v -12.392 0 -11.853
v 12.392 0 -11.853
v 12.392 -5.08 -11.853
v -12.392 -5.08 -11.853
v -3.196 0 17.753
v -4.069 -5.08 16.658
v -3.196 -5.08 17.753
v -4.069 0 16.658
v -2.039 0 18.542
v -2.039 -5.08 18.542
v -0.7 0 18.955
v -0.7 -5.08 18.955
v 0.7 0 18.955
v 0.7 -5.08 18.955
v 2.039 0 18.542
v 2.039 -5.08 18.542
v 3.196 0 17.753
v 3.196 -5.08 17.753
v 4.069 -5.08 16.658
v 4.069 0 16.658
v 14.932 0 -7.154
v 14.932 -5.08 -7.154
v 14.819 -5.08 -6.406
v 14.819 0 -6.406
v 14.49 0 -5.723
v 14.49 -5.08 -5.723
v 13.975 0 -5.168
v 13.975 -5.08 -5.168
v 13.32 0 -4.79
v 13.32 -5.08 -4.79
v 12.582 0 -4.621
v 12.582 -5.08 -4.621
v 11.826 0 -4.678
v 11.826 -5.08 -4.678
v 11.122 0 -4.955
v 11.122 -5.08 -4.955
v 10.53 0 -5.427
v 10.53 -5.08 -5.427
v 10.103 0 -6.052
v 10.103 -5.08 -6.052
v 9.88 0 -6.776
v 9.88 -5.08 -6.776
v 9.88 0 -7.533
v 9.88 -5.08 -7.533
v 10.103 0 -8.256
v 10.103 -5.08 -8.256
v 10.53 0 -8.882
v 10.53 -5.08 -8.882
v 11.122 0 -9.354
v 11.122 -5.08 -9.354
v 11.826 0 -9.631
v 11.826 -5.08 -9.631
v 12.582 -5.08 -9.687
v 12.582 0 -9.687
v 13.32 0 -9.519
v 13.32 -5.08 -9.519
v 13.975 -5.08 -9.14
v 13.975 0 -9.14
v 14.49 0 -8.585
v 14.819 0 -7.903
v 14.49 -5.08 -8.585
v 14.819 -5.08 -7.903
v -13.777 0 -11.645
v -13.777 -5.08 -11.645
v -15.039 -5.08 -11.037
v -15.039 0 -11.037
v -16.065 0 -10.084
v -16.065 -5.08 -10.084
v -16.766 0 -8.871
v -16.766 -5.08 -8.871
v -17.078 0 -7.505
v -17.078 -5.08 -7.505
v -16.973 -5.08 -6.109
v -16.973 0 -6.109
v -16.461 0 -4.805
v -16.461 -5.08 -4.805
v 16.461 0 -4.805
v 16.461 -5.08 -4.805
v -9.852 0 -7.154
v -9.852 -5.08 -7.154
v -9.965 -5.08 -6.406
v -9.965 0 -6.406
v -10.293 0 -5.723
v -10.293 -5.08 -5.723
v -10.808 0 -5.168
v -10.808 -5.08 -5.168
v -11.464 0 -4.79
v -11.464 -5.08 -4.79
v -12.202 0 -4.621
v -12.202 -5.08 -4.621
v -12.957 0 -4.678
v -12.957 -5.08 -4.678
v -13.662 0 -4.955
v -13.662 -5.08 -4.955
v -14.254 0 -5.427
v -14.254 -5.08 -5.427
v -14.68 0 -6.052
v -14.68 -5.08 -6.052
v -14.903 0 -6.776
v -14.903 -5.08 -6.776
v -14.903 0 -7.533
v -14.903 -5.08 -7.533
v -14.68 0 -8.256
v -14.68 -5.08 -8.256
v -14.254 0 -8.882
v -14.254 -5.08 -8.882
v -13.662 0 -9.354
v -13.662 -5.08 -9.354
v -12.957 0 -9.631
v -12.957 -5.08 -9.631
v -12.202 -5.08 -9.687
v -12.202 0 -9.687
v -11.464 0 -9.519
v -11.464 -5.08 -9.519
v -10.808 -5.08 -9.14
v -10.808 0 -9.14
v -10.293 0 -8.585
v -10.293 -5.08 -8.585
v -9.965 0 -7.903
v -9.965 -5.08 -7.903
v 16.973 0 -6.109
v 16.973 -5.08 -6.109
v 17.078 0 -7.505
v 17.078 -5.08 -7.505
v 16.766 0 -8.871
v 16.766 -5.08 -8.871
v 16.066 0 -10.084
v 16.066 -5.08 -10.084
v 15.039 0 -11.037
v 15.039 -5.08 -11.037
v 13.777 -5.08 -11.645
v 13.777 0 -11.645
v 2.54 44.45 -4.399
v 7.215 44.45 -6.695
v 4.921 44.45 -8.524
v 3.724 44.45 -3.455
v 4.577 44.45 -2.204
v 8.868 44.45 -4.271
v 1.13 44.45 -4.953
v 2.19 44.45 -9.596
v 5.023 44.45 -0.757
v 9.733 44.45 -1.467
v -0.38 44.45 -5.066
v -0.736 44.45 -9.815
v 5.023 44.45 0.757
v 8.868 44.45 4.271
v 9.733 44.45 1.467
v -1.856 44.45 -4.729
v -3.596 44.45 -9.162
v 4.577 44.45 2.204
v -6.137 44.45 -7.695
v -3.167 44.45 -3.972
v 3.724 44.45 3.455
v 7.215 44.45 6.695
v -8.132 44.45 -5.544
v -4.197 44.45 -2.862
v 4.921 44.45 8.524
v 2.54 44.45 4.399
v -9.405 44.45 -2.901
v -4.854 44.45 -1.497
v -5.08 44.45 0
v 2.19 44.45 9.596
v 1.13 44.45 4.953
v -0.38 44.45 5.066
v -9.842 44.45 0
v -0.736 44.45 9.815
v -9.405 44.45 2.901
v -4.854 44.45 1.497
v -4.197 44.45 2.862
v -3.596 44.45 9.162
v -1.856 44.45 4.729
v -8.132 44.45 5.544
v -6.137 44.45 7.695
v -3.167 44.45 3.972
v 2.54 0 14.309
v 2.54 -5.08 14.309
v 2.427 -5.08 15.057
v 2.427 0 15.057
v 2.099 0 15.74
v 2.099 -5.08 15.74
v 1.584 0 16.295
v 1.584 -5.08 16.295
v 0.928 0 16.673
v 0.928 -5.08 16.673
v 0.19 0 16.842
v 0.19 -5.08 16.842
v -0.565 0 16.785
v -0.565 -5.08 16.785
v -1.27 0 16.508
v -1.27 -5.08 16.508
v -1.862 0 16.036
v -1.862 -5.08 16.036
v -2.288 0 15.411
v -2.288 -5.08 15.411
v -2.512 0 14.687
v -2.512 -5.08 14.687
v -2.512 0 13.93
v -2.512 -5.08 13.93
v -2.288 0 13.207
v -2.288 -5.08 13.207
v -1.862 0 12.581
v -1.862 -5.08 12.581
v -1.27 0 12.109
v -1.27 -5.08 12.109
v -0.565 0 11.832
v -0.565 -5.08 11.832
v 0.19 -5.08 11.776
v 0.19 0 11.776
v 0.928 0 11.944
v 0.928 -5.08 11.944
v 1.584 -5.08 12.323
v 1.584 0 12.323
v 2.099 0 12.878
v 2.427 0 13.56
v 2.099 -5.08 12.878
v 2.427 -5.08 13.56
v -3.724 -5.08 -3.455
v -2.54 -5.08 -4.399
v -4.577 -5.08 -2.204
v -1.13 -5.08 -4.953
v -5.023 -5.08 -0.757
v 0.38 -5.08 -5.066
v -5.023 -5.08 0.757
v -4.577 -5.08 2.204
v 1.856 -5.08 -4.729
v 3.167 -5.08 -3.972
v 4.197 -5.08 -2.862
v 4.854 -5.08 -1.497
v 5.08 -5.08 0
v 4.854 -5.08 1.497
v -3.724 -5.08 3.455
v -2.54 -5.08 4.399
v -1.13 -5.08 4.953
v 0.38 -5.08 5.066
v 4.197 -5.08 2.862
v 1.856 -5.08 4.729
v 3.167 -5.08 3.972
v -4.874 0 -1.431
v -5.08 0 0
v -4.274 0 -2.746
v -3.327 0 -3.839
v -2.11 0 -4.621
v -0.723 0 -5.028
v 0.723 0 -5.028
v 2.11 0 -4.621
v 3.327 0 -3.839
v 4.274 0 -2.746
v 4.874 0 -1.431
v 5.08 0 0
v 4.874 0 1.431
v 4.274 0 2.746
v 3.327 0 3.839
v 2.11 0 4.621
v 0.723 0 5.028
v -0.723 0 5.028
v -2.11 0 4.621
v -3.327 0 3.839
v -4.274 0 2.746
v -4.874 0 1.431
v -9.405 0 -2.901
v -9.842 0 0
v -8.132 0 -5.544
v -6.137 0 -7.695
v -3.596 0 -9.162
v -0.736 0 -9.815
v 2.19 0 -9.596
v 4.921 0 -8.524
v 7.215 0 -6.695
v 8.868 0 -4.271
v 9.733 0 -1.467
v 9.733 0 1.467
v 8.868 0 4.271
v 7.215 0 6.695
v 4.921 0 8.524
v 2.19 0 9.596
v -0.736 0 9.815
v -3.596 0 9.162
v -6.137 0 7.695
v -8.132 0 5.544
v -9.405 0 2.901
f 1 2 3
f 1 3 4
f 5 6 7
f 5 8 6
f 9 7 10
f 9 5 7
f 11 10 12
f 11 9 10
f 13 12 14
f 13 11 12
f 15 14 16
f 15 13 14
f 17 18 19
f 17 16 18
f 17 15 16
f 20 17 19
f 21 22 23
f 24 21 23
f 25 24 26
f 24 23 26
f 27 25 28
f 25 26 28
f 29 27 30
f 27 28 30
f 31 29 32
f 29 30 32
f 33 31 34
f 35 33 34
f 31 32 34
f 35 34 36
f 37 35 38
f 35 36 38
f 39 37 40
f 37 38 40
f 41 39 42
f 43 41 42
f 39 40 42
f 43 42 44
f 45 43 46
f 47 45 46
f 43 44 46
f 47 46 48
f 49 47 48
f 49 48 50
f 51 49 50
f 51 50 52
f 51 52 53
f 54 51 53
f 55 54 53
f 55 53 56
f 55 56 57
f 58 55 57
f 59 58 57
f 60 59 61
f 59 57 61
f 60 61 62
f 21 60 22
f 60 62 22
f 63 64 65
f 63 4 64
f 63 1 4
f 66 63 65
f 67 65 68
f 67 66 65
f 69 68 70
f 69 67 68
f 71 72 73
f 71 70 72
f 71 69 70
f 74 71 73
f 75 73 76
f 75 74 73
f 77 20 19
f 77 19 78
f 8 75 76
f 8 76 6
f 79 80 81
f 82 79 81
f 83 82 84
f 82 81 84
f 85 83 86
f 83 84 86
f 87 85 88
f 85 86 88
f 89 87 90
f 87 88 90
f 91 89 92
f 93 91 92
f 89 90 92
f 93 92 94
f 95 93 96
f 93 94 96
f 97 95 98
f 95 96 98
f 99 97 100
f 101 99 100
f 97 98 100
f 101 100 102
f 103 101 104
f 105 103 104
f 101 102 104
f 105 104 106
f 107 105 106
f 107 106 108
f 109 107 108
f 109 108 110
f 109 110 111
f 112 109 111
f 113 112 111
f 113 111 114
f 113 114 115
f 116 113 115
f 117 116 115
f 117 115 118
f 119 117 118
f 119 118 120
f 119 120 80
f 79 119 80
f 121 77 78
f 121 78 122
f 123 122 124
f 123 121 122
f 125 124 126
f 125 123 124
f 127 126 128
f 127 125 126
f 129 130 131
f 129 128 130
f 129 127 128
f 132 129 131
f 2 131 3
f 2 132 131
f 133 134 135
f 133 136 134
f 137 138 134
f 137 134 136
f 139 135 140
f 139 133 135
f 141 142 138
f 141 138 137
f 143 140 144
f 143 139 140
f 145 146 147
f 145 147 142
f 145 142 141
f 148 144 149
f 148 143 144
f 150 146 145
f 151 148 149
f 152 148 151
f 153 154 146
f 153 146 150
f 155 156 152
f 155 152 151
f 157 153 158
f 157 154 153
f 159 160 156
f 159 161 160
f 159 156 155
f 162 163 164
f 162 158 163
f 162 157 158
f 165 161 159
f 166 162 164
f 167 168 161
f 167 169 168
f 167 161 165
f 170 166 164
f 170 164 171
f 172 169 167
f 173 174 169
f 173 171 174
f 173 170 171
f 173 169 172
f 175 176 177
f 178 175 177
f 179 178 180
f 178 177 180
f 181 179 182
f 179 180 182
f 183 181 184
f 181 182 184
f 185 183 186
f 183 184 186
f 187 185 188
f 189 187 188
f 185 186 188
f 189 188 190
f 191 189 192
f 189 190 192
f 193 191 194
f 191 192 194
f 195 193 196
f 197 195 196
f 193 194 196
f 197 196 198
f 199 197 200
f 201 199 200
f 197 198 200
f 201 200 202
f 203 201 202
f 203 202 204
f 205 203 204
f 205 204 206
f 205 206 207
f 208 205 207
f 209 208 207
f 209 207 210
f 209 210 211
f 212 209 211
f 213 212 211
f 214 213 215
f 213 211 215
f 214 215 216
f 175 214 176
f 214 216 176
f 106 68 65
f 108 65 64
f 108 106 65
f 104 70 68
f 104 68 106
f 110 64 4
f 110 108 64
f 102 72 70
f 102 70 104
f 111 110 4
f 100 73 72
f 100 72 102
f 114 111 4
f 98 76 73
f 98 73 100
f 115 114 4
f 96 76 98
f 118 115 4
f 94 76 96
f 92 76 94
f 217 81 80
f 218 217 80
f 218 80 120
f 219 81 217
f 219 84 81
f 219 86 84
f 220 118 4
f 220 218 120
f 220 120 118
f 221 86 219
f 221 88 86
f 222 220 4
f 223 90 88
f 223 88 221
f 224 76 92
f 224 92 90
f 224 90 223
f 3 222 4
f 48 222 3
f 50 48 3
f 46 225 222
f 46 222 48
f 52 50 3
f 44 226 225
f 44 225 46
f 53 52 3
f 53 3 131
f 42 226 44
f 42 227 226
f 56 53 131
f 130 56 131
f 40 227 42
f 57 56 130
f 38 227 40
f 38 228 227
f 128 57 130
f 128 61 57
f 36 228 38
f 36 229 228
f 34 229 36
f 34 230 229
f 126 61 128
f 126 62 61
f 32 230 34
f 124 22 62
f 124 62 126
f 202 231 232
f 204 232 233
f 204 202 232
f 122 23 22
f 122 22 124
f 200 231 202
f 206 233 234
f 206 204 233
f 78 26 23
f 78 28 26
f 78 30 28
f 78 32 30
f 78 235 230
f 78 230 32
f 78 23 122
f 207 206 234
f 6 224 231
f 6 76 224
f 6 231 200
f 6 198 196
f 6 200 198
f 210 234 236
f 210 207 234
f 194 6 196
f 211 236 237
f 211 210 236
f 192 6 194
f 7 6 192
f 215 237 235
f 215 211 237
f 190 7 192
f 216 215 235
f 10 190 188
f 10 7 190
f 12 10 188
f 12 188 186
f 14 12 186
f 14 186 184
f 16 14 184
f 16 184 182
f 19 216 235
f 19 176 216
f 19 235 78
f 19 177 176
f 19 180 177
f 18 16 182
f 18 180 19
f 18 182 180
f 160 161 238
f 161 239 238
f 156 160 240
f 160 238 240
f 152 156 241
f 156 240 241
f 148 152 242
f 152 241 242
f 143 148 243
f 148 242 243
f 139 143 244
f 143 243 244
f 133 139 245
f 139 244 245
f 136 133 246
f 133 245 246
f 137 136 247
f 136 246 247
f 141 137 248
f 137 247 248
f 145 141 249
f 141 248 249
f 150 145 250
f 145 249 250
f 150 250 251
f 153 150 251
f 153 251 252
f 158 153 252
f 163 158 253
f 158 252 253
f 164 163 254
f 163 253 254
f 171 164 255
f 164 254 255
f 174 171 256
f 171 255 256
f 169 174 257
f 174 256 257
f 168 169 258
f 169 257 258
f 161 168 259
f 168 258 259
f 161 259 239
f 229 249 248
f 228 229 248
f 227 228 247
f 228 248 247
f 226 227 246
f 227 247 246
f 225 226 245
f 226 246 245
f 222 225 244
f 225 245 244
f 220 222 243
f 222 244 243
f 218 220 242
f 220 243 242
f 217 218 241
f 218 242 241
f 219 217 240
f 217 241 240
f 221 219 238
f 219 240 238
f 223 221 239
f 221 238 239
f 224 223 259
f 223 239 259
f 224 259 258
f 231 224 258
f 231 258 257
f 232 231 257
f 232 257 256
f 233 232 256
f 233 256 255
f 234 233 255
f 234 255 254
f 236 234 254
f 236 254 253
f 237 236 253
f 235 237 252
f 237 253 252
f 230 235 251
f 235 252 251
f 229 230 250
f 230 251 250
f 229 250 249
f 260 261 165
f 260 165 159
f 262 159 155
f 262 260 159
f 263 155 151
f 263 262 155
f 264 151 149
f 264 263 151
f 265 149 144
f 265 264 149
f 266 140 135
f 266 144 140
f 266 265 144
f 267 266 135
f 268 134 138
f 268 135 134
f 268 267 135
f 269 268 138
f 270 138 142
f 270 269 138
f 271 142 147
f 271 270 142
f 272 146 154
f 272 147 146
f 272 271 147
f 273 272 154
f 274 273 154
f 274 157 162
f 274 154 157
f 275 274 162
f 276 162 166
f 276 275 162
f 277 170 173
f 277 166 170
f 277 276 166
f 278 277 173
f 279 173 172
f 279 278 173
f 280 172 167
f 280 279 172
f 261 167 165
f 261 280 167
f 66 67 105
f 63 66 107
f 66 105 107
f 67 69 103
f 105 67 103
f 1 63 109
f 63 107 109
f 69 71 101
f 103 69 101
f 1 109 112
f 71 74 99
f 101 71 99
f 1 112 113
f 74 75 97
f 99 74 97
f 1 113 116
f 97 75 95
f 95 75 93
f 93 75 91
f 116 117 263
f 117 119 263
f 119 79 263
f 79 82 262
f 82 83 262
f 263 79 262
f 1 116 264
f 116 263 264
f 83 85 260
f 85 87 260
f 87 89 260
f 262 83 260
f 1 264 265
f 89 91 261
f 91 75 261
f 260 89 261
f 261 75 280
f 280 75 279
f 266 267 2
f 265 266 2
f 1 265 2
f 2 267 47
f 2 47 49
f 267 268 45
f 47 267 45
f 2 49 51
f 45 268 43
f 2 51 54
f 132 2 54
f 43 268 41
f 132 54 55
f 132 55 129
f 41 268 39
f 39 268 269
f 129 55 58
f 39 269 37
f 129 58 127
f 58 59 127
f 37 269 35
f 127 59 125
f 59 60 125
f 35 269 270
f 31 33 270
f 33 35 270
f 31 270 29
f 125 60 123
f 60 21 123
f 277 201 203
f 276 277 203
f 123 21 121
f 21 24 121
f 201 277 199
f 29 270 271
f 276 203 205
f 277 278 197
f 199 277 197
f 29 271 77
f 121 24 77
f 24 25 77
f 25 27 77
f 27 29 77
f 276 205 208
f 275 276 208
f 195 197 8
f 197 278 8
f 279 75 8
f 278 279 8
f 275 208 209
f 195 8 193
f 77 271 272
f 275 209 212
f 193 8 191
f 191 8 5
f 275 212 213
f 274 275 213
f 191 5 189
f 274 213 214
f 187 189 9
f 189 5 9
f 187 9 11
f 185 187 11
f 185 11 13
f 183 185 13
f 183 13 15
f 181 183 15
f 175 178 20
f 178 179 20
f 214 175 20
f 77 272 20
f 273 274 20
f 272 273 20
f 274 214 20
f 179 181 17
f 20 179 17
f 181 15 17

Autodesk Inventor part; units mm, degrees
ref_plane "YZ Plane" through (0, 0, 0) normal (1, 0, 0) x (0, 1, 0)
ref_plane "XZ Plane" through (0, 0, 0) normal (0, 1, 0) x (-1, 0, 0)
ref_plane "XY Plane" through (0, 0, 0) normal (0, 0, 1) x (1, 0, 0)
sketch "Sketch1" plane through (0, 0, 0) normal (0, 1, 0) x (-1, 0, 0)
  circle A0 centre (0, 0) radius 9.8425
  circle A1 centre (0, 0) radius 5.08
  dimension "d0" = 19.685
  dimension "d1" = 10.16
extrude "Extrusion1" add sketch "Sketch1" along normal blind 44.45
sketch "Sketch2" plane through (0, 0, 0) normal (0, -1, 0) x (1, 0, 0)
  circle A0 centre (0, 0) radius 9.8425 projected
  line L0 (4.0695, 16.6582) -> (16.4611, -4.8048)
  line L1 (12.3917, -11.8533) -> (-12.3917, -11.8533)
  line L2 (-16.4611, -4.8048) -> (-4.0695, 16.6582)
  arc A1 (4.0695, 16.6582) -> (-4.0695, 16.6582) centre (0, 14.3087) ccw
  arc A2 (-16.4611, -4.8048) -> (-12.3917, -11.8533) centre (-12.3917, -7.1543) ccw
  arc A3 (12.3917, -11.8533) -> (16.4611, -4.8048) centre (12.3917, -7.1543) ccw
  circle A4 centre (0, 0) radius 5.08 projected
  circle A5 centre (0, 0) radius 5.08
  point P0 (0, 23.7067)
  point P1 (20.5306, -11.8533)
  point P2 (-20.5306, -11.8533)
  dimension "d4" = 35.56
  dimension "d5" = 35.56
  dimension "d6" = 4.699
  dimension "d7" = 4.699
  dimension "d8" = 4.699
extrude "Extrusion2" add sketch "Sketch2" along normal blind 5.08 contours A0 | L0 A3 L1 A2 L2 A1
sketch "Sketch3" plane through (0, -5.08, 0) normal (0, -1, 0) x (1, 0, 0)
  arc A0 (4.0695, 16.6582) -> (-4.0695, 16.6582) centre (0, 14.3087) ccw projected
  arc A1 (-16.4611, -4.8048) -> (-12.3917, -11.8533) centre (-12.3917, -7.1543) ccw projected
  arc A2 (12.3917, -11.8533) -> (16.4611, -4.8048) centre (12.3917, -7.1543) ccw projected
  circle A3 centre (0, 14.3087) radius 2.54
  circle A4 centre (12.3917, -7.1543) radius 2.54
  circle A5 centre (-12.3917, -7.1543) radius 2.54
  dimension "d11" = 5.08
  dimension "d12" = 5.08
  dimension "d13" = 5.08
extrude "Extrusion3" cut sketch "Sketch3" against normal blind 5.08
properties part number "ScrewShaft"
